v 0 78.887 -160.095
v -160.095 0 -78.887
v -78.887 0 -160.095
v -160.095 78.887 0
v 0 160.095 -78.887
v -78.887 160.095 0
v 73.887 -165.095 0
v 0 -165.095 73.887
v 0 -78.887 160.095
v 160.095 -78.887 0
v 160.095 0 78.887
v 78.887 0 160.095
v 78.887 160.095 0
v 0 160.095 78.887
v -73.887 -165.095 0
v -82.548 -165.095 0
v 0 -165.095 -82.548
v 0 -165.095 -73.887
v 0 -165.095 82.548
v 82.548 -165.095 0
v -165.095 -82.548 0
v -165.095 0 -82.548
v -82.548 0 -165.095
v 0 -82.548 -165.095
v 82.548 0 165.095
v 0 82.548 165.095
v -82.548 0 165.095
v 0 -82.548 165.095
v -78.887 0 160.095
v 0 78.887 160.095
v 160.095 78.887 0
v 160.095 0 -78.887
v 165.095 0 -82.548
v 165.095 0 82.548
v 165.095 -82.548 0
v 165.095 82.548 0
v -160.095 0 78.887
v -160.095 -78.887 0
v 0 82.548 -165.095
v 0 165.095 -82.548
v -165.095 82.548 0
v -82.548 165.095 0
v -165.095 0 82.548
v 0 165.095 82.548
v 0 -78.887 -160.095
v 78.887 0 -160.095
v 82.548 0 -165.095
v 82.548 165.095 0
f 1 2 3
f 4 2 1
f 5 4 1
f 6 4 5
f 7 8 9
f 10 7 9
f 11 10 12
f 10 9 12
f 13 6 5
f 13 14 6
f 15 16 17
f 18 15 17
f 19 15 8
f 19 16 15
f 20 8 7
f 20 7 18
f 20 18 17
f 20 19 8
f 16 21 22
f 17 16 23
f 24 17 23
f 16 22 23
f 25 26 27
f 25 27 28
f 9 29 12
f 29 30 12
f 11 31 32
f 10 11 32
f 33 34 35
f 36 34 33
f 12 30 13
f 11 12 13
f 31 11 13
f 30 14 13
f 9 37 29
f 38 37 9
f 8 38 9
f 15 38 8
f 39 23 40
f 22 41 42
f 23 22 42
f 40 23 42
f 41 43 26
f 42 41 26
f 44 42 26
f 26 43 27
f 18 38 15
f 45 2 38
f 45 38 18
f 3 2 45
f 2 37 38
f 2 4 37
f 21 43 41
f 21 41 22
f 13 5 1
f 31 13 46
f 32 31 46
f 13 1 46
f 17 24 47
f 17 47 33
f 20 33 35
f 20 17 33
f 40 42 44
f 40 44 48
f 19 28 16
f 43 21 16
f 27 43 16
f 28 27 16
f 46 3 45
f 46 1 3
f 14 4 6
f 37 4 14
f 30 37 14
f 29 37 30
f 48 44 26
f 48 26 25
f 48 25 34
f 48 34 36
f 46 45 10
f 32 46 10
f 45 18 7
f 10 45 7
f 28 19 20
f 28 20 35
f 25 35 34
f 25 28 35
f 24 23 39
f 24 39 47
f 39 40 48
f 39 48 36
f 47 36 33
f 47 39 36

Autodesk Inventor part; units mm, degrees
ref_plane "YZ Plane" through (0, 0, 0) normal (1, 0, 0) x (0, 1, 0)
ref_plane "XZ Plane" through (0, 0, 0) normal (0, 1, 0) x (-1, 0, 0)
sketch "Sketch26" plane through (0, 0, 0) normal (0, 0, 1) x (1, 0, 0)
  line L0 (82.5476, 0) -> (0, 82.5476)
  line L1 (0, 82.5476) -> (-82.5476, 0)
  line L2 (-82.5476, 0) -> (0, -82.5476)
  line L3 (0, -82.5476) -> (82.5476, 0)
  line L4 (-58.37, -58.37) -> (58.37, 58.37) construction
  line L5 (58.37, -58.37) -> (-58.37, 58.37) construction
  point P0 (0, 0)
  dimension "d97" = 116.74
  dimension "d98" = 165.0953
extrude "Extrusion9" add sketch "Sketch26" along normal mid plane 330.1906
pattern_circular "Circular Pattern14" count 4 over 360 about axis through (-10, 0, 0) along (1, 0, 0) of "Extrusion9"
pattern_circular "Circular Pattern15" count 4 over 360 about axis through (0, -10, 0) along (0, 1, 0) of "Extrusion9"
ref_plane "Work Plane9" through (82.5476, 165.0953, 0) normal (0.5773503, 0.5773503, 0.5773503) x (0.7071068, 0, -0.7071068)
sketch "Sketch27" plane through (82.5476, 165.0953, 0) normal (0.5773503, 0.5773503, 0.5773503) x (0.7071068, 0, -0.7071068)
  line L0 (-116.74, -67.3999) -> (-116.74, 0) projected
  line L1 (-116.74, 0) -> (0, 0)
  line L2 (0, 0) -> (58.37, -101.0998)
  line L3 (58.37, -101.0998) -> (0, -202.1996)
  line L4 (0, -202.1996) -> (-116.74, -202.1996)
  line L5 (-116.74, -202.1996) -> (-175.11, -101.0998)
  line L6 (-175.11, -101.0998) -> (-116.74, 0)
  point P0 (-58.37, -101.0998)
  point P1 (-58.37, -101.0998)
extrude "Extrusion10" add sketch "Sketch27" against normal up to surface (285.9534 mm away)
pattern_circular "Circular Pattern16" count 4 over 360 about axis through (-10, 0, 0) along (1, 0, 0) of "Extrusion10"
shell "Shell2" thickness 5 removed faces 1 at (0, -165.0953, -27.5159)
equation "\"d99\" = 2 * d98"
equation "\"d107\" = 2 * d98"
properties part number "Dome" material "Glass"
